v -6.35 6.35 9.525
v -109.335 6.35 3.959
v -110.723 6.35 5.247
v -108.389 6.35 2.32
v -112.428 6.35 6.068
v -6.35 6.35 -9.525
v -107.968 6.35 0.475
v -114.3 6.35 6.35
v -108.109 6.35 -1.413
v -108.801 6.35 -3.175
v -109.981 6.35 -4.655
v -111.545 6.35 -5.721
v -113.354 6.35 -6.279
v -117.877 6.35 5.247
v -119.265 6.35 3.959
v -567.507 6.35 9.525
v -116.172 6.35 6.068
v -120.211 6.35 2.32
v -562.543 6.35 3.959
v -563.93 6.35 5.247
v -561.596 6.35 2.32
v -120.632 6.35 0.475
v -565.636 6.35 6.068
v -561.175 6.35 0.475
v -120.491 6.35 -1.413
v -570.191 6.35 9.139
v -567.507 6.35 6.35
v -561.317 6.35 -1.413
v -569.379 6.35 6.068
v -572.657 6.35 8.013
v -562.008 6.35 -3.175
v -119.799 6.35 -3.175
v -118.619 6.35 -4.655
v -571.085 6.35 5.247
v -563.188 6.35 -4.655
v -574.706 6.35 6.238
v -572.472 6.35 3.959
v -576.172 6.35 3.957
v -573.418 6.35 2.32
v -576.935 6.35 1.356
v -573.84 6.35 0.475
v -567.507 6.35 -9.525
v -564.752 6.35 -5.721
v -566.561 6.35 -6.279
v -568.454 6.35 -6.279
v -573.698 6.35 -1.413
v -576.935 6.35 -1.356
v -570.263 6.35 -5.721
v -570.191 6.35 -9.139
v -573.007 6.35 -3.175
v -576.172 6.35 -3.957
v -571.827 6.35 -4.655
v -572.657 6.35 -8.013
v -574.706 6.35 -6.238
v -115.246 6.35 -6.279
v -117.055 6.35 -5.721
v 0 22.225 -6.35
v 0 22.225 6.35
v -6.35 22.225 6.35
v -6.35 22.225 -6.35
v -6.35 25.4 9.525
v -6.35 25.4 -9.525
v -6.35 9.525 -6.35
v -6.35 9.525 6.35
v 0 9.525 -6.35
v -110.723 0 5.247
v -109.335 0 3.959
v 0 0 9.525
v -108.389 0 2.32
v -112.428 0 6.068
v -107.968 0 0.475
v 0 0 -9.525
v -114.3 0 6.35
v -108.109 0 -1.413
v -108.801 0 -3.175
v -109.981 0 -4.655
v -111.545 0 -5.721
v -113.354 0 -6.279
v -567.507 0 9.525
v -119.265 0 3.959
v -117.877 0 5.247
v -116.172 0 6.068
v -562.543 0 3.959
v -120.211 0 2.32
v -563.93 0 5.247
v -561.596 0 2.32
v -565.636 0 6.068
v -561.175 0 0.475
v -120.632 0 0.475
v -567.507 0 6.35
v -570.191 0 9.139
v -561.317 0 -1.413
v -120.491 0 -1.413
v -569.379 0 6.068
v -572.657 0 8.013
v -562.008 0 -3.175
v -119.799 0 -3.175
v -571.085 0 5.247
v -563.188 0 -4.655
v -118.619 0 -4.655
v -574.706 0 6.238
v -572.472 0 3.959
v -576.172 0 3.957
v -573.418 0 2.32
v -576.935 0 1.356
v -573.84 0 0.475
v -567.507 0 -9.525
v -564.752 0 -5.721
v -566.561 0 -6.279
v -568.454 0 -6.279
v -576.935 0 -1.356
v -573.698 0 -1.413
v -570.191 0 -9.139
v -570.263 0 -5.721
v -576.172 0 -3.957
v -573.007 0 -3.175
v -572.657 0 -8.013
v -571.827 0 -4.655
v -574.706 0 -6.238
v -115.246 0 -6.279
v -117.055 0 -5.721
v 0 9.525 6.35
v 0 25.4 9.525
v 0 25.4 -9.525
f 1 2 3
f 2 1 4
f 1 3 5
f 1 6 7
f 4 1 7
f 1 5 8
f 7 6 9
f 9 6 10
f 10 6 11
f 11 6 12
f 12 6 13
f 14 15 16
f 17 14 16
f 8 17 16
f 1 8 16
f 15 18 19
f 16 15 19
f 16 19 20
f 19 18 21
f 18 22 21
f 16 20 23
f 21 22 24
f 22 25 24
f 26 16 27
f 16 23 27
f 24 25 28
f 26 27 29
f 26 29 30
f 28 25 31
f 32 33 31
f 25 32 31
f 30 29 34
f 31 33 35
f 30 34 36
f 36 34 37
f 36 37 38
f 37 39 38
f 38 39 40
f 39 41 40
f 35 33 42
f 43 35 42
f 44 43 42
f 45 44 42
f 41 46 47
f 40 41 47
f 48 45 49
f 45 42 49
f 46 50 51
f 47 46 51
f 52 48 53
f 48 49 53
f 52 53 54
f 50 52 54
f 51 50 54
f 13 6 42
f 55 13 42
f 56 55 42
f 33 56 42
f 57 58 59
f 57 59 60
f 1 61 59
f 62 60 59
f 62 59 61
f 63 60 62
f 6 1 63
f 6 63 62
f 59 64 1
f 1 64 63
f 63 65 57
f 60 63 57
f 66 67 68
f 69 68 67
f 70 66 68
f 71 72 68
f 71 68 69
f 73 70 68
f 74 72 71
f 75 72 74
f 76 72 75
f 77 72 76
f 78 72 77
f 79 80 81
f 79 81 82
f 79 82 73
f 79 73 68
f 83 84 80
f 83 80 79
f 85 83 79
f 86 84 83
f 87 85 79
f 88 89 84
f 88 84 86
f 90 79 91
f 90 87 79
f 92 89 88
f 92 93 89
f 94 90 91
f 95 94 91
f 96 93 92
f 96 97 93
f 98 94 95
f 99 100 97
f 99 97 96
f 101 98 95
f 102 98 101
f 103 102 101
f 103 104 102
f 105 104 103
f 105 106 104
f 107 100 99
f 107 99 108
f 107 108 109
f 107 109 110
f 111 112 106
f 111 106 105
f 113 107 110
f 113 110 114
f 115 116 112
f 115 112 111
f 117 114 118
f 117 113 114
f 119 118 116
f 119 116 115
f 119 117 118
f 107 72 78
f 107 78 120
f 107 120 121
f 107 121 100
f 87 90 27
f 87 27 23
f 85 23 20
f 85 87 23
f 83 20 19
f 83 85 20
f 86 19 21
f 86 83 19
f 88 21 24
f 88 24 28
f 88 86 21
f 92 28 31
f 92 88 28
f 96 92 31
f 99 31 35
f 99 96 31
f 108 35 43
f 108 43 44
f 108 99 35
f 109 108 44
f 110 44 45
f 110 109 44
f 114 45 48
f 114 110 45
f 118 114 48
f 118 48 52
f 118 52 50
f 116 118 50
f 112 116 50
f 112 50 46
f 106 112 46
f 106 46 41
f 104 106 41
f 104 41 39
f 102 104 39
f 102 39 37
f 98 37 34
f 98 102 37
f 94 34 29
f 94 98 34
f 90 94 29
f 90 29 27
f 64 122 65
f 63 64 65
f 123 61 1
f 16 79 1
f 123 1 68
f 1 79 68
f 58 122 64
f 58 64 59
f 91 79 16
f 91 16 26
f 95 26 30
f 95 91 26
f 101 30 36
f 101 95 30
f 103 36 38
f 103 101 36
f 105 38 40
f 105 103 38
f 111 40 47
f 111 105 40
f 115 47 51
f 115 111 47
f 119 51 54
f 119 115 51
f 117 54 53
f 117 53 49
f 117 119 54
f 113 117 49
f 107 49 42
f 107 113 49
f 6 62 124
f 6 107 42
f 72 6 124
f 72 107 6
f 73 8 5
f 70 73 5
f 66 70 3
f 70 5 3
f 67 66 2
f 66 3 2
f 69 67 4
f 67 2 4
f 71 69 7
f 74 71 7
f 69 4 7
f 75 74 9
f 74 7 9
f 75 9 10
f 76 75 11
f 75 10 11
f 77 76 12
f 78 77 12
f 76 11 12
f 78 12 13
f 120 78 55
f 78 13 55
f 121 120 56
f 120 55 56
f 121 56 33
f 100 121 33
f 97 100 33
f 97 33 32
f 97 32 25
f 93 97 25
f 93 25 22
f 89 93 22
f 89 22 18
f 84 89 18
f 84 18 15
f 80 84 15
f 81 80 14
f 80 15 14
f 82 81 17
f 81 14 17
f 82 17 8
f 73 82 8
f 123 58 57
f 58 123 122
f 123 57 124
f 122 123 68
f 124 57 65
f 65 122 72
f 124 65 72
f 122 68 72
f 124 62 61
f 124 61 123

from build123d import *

# Parameters (mm, degrees)
SKETCH1_R           = 6.35
BOSS_EXTRUDE1_DEPTH = 6.35
SKETCH2_R           = 6.35
CUT_EXTRUDE1_DEPTH  = 6.35
CUT_EXTRUDE2_START  = -6.35
CUT_EXTRUDE2_DEPTH  = 6.35
SKETCH4_W           = 6.35
SKETCH4_H           = 19.05
BOSS_EXTRUDE2_DEPTH = 19.05
SKETCH5_W           = 12.7
SKETCH5_H           = 12.7
CUT_EXTRUDE3_DEPTH  = 19.05


with BuildPart() as part:
    # Sketch1 → Boss-Extrude1 (new body)
    with BuildSketch(Plane(origin=(0, 0, 0), x_dir=(1, 0, 0), z_dir=(0, 1, 0))):
        with BuildLine():
            Line((0, -9.525), (-567.5074248, -9.525))
            ThreePointArc((-567.5074248, -9.525), (-577.0324248, 0), (-567.5074248, 9.525))
            Line((-567.5074248, 9.525), (0, 9.525))
            ThreePointArc((0, 9.525), (9.525, 0), (0, -9.525))
        make_face()
        with Locations(Location((-567.5074248, 0, 0), (0, 0, 270))):
            Circle(SKETCH1_R, mode=Mode.SUBTRACT)
    extrude(amount=BOSS_EXTRUDE1_DEPTH)

    # Sketch2 → Cut-Extrude1 (cut)
    with BuildSketch(Plane(origin=(0, 6.35, 0), x_dir=(1, 0, 0), z_dir=(0, 1, 0))):
        with Locations(Location((-114.3, 0, 0), (0, 0, 270))):
            Circle(SKETCH2_R)
    extrude(amount=-CUT_EXTRUDE1_DEPTH, mode=Mode.SUBTRACT)

    # Sketch3 → Cut-Extrude2 (cut)
    with BuildSketch(Plane(origin=(0, 6.35, 0), x_dir=(1, 0, 0), z_dir=(0, 1, 0)).offset(CUT_EXTRUDE2_START)):
        with BuildLine():
            Line((0, -9.525), (0, 9.525))
            ThreePointArc((0, 9.525), (9.525, 0), (0, -9.525))
        make_face()
    extrude(amount=CUT_EXTRUDE2_DEPTH, mode=Mode.SUBTRACT)

    # Sketch4 → Boss-Extrude2 (add)
    with BuildSketch(Plane(origin=(0, 6.35, 0), x_dir=(1, 0, 0), z_dir=(0, 1, 0))):
        with Locations((-3.175, 0)):
            Rectangle(SKETCH4_W, SKETCH4_H)
    extrude(amount=BOSS_EXTRUDE2_DEPTH)

    # Sketch5 → Cut-Extrude3 (cut)
    with BuildSketch(Plane(origin=(0, 0, 0), x_dir=(0, 0, -1), z_dir=(1, 0, 0))):
        with Locations((0, 15.875)):
            Rectangle(SKETCH5_W, SKETCH5_H)
    extrude(amount=-CUT_EXTRUDE3_DEPTH, mode=Mode.SUBTRACT)


solid = part.part
